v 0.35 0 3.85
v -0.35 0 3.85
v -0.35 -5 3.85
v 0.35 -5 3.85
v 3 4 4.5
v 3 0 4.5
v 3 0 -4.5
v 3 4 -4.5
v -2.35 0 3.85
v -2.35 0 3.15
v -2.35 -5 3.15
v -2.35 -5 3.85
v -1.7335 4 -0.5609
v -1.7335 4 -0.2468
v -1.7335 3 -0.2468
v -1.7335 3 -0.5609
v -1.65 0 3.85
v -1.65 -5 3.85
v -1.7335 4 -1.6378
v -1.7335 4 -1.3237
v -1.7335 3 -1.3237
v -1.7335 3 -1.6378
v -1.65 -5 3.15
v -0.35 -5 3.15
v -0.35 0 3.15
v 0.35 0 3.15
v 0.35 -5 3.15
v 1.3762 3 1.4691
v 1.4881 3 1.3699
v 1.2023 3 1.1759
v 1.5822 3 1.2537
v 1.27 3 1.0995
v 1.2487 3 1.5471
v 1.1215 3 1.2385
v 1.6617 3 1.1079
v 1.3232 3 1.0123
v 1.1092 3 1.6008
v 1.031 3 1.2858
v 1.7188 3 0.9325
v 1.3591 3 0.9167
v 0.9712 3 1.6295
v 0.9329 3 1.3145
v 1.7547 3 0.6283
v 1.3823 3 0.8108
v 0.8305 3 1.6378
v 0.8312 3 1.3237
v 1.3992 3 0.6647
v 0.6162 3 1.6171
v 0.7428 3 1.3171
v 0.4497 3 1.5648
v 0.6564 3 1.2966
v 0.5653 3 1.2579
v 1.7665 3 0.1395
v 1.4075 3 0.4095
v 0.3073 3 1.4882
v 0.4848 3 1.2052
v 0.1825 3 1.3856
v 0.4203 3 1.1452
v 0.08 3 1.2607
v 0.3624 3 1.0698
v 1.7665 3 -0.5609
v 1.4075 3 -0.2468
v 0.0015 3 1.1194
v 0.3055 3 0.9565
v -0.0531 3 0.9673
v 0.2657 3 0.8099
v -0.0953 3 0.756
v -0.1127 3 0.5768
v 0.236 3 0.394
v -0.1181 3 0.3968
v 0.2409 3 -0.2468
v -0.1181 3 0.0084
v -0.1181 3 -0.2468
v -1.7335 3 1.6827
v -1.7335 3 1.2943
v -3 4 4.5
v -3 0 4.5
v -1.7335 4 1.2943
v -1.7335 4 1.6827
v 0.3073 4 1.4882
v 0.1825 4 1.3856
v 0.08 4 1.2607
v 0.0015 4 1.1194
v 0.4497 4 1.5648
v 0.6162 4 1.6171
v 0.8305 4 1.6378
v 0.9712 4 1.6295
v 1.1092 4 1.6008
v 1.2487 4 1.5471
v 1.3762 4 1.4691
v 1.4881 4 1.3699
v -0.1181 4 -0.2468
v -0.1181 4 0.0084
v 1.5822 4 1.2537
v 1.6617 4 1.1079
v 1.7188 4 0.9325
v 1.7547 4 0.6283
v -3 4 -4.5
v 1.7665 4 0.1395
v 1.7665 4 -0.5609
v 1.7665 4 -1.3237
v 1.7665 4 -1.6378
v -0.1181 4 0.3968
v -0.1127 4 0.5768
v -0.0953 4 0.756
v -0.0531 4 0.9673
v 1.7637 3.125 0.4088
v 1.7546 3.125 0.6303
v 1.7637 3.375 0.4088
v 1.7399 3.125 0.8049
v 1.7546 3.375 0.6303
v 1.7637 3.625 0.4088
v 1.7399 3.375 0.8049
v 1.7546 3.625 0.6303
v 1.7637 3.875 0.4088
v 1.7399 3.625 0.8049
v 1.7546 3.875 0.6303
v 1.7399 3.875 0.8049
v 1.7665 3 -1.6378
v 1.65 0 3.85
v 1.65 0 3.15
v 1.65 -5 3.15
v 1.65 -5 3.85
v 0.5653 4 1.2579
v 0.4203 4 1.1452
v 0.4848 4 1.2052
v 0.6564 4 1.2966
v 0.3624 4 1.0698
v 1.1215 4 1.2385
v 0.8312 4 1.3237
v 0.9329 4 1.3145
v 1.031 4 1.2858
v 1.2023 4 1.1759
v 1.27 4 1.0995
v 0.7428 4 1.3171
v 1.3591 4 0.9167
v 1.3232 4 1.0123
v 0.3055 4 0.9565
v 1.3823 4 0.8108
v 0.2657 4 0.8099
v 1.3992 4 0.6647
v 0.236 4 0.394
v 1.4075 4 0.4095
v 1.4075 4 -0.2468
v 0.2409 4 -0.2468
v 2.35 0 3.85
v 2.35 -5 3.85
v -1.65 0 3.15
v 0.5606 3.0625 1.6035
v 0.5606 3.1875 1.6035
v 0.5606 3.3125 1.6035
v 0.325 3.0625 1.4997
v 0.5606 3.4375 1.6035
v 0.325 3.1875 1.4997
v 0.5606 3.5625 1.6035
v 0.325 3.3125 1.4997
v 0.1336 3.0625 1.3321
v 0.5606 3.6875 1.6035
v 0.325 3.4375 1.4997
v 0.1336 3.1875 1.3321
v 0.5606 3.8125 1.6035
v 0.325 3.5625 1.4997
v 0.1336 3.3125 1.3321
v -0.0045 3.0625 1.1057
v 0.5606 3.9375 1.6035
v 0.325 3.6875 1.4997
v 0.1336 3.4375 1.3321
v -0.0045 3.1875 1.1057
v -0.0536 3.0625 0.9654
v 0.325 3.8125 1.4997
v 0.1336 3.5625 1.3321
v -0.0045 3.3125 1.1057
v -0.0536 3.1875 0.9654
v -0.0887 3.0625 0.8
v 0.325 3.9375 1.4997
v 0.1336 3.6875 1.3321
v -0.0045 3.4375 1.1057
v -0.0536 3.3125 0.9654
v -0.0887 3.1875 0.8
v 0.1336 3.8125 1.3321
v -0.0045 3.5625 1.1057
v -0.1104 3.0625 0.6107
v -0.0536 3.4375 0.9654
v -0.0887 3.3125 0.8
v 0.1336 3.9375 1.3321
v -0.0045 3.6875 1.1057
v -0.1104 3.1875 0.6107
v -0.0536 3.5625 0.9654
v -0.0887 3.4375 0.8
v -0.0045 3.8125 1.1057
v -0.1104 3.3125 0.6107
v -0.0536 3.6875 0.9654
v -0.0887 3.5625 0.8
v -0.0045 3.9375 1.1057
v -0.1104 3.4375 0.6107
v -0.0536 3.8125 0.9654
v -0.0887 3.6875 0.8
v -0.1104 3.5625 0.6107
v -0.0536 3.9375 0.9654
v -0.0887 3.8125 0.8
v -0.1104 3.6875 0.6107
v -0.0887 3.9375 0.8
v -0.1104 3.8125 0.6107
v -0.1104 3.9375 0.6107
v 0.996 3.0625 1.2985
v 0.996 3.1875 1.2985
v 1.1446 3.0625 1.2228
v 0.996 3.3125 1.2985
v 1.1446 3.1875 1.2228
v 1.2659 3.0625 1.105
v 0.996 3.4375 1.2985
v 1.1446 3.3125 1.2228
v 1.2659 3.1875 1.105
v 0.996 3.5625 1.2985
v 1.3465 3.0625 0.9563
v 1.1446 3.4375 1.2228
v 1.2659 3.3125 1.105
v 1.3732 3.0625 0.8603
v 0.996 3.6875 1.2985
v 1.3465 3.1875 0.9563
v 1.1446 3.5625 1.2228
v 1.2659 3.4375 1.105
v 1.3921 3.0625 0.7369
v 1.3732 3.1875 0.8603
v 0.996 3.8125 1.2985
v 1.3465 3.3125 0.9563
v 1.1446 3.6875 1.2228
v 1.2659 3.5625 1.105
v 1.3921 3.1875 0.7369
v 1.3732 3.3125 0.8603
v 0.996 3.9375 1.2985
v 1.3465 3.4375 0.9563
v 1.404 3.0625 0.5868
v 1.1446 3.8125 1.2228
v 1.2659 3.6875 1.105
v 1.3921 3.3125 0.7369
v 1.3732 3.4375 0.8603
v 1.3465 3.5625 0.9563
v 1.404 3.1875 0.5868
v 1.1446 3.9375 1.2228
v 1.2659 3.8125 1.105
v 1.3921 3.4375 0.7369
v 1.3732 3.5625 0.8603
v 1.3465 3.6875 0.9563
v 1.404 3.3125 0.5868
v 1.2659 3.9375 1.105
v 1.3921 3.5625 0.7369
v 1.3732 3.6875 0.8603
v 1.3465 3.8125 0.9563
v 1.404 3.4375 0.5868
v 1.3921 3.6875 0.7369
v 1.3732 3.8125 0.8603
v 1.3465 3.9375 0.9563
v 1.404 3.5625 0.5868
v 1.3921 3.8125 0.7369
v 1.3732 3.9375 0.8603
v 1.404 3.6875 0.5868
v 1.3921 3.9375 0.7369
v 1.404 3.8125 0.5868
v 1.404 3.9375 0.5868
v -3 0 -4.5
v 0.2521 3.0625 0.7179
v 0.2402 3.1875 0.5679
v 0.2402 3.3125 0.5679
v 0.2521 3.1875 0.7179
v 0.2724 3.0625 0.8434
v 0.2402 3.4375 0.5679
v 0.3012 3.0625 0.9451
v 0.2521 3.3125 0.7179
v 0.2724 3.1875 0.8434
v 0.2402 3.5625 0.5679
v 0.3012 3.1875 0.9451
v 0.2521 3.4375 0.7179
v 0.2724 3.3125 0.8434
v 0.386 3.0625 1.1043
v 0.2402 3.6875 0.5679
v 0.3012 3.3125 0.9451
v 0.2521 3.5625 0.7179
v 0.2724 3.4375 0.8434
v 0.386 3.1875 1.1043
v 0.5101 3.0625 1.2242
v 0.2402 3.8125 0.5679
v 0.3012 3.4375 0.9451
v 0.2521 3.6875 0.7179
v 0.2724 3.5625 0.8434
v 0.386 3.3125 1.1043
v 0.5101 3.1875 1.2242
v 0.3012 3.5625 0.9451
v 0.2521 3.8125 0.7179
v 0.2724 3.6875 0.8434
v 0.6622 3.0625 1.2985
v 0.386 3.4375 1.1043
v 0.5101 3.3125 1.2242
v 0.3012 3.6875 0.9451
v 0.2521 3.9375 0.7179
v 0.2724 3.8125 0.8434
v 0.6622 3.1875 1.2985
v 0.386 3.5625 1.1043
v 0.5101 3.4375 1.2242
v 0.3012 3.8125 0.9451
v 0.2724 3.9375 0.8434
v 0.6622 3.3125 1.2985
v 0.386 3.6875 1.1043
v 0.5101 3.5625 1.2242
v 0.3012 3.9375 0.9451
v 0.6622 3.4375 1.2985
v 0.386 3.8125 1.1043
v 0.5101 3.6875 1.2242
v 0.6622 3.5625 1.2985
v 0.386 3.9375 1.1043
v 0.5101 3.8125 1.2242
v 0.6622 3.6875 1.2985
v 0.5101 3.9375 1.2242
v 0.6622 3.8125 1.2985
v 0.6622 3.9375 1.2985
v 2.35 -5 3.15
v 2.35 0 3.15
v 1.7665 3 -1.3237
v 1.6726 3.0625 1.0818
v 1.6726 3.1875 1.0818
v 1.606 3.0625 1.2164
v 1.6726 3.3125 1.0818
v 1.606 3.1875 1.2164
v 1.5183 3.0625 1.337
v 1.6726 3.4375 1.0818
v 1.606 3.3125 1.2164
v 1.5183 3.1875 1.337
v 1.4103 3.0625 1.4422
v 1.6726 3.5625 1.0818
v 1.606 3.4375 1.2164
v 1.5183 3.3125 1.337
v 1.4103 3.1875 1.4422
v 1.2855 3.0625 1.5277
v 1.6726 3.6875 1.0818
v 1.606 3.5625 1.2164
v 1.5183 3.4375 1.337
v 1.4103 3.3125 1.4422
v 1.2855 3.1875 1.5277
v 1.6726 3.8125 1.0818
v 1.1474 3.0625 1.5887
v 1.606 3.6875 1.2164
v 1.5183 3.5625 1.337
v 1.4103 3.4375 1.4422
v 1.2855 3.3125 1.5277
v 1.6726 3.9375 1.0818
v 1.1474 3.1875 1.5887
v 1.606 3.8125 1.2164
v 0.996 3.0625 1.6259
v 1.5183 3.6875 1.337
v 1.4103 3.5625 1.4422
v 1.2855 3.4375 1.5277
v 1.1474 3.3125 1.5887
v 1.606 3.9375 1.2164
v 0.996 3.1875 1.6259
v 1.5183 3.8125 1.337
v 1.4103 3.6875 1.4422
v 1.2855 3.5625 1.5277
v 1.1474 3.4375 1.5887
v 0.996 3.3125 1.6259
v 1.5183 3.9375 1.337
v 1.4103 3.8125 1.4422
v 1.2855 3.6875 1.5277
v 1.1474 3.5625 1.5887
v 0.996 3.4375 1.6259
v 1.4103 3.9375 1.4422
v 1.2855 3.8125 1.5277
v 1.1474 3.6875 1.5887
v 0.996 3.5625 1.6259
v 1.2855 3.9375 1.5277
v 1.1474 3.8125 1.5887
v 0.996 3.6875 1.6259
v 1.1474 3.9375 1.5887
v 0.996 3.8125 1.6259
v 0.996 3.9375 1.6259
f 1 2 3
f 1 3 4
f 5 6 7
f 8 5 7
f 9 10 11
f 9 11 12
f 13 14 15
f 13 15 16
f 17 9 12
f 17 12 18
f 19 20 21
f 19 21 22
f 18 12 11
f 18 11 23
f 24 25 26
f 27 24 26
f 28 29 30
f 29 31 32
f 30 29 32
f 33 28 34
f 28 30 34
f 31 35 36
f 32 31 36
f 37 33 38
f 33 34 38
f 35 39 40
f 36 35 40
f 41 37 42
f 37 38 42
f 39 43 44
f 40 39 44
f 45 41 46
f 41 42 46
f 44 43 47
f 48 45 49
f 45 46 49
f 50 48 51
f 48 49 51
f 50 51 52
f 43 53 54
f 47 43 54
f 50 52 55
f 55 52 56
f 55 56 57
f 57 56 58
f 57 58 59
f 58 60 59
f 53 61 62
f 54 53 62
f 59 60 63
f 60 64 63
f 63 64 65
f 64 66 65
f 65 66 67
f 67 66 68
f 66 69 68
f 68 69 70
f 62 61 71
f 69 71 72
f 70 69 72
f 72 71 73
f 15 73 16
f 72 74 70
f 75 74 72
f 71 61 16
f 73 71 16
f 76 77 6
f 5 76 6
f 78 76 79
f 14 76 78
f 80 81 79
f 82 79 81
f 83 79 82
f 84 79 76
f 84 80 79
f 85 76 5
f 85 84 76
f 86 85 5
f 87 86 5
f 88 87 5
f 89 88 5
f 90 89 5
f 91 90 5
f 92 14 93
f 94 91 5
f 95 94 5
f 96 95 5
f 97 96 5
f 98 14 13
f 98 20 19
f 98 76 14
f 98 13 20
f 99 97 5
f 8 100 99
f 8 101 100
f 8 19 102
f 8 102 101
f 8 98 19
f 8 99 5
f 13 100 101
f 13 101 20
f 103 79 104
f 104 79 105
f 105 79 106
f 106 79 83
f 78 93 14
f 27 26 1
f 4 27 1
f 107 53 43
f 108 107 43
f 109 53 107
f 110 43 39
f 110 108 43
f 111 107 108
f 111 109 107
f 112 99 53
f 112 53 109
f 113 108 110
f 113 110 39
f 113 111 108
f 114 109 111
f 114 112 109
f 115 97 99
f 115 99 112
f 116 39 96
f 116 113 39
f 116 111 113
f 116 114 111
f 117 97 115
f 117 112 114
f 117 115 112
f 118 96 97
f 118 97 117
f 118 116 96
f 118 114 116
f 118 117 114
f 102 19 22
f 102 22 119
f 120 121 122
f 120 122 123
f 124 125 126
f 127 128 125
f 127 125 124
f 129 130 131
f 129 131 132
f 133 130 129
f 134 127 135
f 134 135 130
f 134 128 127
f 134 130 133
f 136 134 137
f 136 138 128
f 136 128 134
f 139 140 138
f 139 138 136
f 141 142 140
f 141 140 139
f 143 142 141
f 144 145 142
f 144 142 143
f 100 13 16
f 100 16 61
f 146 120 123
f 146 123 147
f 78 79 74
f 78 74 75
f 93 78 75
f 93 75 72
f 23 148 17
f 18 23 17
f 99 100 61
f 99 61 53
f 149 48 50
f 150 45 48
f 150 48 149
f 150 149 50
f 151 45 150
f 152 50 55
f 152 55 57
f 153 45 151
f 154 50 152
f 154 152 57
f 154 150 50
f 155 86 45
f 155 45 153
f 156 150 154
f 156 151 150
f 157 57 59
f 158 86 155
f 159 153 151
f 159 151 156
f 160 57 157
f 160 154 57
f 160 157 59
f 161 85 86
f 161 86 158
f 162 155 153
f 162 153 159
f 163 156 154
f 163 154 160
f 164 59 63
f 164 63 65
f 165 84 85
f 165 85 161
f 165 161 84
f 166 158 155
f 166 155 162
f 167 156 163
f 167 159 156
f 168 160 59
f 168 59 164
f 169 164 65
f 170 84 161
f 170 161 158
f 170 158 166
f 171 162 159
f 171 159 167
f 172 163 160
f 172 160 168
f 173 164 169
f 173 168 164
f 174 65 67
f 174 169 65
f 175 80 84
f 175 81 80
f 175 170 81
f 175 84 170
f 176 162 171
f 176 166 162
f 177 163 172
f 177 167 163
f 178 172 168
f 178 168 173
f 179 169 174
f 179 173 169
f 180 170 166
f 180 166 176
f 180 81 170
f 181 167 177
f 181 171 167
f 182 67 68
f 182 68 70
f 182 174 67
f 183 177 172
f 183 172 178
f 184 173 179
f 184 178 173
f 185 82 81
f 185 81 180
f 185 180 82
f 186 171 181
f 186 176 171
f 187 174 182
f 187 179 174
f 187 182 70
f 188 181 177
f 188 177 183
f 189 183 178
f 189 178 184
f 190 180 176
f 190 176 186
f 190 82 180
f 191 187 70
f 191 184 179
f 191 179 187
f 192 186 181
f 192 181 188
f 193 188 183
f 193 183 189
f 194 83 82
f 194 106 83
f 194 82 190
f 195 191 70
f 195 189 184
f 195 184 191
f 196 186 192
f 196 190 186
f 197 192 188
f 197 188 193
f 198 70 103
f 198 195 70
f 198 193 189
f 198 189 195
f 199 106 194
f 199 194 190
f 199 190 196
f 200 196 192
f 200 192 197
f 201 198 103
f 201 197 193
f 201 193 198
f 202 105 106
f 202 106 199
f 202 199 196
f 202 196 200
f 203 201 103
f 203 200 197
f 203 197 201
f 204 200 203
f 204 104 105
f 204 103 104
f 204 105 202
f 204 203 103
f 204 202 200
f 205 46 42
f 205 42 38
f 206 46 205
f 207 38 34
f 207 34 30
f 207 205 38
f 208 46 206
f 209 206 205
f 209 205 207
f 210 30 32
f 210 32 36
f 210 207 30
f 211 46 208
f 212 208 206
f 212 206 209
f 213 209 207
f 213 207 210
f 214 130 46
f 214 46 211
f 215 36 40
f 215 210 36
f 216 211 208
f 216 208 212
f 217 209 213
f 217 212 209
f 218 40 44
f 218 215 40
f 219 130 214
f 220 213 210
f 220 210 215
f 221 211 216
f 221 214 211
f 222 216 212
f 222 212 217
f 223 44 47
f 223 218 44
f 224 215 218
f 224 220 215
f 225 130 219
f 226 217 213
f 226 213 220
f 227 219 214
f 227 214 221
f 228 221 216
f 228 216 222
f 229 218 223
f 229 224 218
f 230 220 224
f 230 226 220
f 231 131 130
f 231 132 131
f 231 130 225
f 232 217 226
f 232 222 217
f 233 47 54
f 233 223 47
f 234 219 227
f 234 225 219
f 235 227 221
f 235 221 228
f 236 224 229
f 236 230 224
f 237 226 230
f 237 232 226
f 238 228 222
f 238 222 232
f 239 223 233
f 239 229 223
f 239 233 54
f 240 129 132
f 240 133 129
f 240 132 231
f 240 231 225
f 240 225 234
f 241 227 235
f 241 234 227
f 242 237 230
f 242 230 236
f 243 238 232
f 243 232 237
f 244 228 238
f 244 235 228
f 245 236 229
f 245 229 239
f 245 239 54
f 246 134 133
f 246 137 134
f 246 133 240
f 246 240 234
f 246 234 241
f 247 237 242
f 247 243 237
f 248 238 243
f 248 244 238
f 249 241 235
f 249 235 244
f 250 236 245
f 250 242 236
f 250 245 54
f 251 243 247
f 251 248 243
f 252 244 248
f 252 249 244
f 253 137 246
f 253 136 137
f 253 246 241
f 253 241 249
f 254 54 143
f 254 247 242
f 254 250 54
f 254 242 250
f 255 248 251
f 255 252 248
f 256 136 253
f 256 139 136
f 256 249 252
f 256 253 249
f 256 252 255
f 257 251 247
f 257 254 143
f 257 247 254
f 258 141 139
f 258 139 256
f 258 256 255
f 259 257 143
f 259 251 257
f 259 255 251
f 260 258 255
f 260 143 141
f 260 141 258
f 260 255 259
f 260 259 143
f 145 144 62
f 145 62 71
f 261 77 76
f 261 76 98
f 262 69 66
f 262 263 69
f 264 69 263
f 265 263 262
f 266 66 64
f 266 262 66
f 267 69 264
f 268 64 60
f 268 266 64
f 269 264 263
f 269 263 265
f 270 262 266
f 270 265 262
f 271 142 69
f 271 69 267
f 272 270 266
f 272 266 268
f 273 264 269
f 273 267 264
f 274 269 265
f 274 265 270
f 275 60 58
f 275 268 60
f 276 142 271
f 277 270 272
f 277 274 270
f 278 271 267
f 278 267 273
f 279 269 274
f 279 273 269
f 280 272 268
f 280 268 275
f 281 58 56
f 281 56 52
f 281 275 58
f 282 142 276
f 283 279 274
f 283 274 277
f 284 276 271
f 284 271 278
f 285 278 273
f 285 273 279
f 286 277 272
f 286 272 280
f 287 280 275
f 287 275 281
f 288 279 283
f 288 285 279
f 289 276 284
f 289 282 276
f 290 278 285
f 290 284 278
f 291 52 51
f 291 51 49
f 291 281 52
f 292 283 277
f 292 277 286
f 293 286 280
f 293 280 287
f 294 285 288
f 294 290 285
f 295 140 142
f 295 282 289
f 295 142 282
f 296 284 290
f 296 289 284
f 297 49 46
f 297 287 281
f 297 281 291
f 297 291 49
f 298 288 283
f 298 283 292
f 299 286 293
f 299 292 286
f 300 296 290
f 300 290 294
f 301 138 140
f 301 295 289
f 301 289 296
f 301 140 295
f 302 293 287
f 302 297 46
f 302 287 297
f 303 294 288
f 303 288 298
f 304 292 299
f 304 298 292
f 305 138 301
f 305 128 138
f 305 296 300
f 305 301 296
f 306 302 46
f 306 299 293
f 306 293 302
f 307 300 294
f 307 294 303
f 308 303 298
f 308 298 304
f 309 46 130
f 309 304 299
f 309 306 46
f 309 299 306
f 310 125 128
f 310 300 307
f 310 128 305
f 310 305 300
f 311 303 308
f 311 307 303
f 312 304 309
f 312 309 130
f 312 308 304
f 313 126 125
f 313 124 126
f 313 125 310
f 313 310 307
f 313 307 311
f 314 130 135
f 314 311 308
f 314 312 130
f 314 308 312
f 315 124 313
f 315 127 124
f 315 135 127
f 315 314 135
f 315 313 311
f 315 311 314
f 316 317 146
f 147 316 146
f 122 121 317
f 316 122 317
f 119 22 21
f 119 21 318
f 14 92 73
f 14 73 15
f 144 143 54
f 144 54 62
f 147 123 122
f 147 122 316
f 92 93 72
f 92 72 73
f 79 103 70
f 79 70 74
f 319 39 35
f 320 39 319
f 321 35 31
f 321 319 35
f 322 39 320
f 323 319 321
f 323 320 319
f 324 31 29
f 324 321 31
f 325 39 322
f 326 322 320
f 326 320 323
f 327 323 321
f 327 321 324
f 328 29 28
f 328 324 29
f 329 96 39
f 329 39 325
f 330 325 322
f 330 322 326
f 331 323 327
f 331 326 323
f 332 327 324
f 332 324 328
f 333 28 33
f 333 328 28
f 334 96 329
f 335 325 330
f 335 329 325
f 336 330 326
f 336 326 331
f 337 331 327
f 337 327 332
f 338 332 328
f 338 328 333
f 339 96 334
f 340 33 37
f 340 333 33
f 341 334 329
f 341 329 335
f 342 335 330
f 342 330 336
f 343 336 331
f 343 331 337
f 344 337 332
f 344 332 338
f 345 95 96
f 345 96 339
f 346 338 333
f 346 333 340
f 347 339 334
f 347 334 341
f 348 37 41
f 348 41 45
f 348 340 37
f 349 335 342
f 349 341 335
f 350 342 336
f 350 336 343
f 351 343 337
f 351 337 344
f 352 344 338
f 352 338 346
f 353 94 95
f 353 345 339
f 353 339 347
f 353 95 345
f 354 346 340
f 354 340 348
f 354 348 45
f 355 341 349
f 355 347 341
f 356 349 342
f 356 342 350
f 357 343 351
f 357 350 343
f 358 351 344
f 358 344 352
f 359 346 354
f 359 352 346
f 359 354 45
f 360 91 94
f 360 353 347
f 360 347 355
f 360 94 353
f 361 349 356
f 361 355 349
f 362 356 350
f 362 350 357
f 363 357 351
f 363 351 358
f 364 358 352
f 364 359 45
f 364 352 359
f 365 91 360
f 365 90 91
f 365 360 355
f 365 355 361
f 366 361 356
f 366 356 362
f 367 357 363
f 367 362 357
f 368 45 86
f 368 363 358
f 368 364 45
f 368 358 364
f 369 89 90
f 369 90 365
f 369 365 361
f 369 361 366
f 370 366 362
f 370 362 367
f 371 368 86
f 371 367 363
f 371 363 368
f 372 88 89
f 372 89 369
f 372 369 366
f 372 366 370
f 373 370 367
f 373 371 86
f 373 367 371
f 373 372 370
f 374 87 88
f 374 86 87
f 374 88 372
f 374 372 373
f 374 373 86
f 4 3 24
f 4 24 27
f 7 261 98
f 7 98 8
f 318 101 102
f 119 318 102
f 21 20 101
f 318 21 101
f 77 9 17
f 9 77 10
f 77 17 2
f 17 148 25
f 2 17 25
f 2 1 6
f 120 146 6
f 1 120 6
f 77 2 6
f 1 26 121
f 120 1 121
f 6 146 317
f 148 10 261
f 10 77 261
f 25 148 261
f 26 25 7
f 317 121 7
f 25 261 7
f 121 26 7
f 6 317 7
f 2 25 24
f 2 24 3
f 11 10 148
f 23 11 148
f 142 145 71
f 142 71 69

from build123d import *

# Parameters (mm, degrees)
SKETCH1_W           = 6
SKETCH1_H           = 9
BOSS_EXTRUDE1_DEPTH = 4
SKETCH2_W           = 0.7
SKETCH2_H           = 0.7
BOSS_EXTRUDE2_DEPTH = 5
SKETCH3_W           = 3.5
SKETCH3_H           = 0.314102564
CUT_EXTRUDE1_DEPTH  = 1


with BuildPart() as part:
    # Sketch1 → Boss-Extrude1 (new body)
    with BuildSketch(Plane(origin=(0, 0, 0), x_dir=(1, 0, 0), z_dir=(0, 1, 0))):
        Rectangle(SKETCH1_W, SKETCH1_H)
    extrude(amount=BOSS_EXTRUDE1_DEPTH)

    # Sketch2 → Boss-Extrude2 (add)
    with BuildSketch(Plane.XZ):
        with Locations((-2, 3.5)):
            Rectangle(SKETCH2_W, SKETCH2_H)
        with Locations((0, 3.5)):
            Rectangle(SKETCH2_W, SKETCH2_H)
        with Locations((2, 3.5)):
            Rectangle(SKETCH2_W, SKETCH2_H)
    extrude(amount=BOSS_EXTRUDE2_DEPTH)

    # Sketch3 → Cut-Extrude1 (cut)
    # profile 1 of 2: a face of its own
    with BuildSketch(Plane(origin=(0, 4, 0), x_dir=(1, 0, 0), z_dir=(0, 1, 0))):
        with Locations((0.016516605, 1.480769231)):
            Rectangle(SKETCH3_W, SKETCH3_H)
    # profile 2 of 2: a face of its own
    with BuildSketch(Plane(origin=(0, 4, 0), x_dir=(1, 0, 0), z_dir=(0, 1, 0))):
        with BuildLine():
            Line((1.766516605, 0.560897436), (1.766516605, -0.139523237))
            add(Edge.make_bspline(
                [(1.766516605, -0.139523237), (1.766361019, -0.186264366), (1.766062277, -0.27601251), (1.764396514, -0.40458578), (1.759622158, -0.521412877), (1.755513575, -0.626432717), (1.748021633, -0.719643372), (1.740860986, -0.801330663), (1.731487326, -0.87111836), (1.722781903, -0.913364211), (1.718840323, -0.932491987)],
                knots=[0, 0, 0, 0, 1.410062039, 2.707475311, 3.878576406, 4.937260626, 5.877586885, 6.699081471, 7.410979367, 8, 8, 8, 8], degree=3))
            add(Edge.make_bspline(
                [(1.718840323, -0.932491987), (1.712514276, -0.958099062), (1.699997132, -1.008766944), (1.673527119, -1.081710467), (1.64294591, -1.151248932), (1.606748352, -1.217121383), (1.565565808, -1.27933393), (1.519157663, -1.337793424), (1.467287579, -1.392165635), (1.4112801, -1.442868932), (1.350646542, -1.488829838), (1.286270173, -1.528602989), (1.218553628, -1.562660539), (1.147261096, -1.589849705), (1.072995235, -1.611722556), (0.995107565, -1.627150208), (0.913946279, -1.636401005), (0.858588413, -1.637342914), (0.830519009, -1.637820513)],
                knots=[0, 0, 0, 0, 1.02737288, 2.032829108, 3.019628684, 3.985738875, 4.958353778, 5.924249254, 6.890702889, 7.883913451, 8.865824512, 9.85161466, 10.829249435, 11.81541824, 12.821369441, 13.843154991, 14.906364023, 16, 16, 16, 16], degree=3))
            add(Edge.make_bspline(
                [(0.830519009, -1.637820513), (0.783883851, -1.636351553), (0.692886578, -1.633485231), (0.560826446, -1.606759595), (0.437634391, -1.562985023), (0.323481852, -1.502654559), (0.220533831, -1.425861636), (0.130417059, -1.333574003), (0.05430934, -1.22626297), (0.002092736, -1.125894415), (-0.031505665, -1.037192031), (-0.055264297, -0.963952361), (-0.073311274, -0.883999597), (-0.089713454, -0.798480783), (-0.102229635, -0.706735362), (-0.111118503, -0.608948089), (-0.116834112, -0.50487439), (-0.117669187, -0.433534628), (-0.118098779, -0.396834936)],
                knots=[0, 0, 0, 0, 1.260402266, 2.459371274, 3.627181936, 4.786749125, 5.93865593, 7.087644312, 8.261344208, 9.485713728, 10.136162886, 10.825977872, 11.566646758, 12.35154167, 13.181268117, 14.0701832, 15.007234106, 16, 16, 16, 16], degree=3))
            Line((-0.118098779, -0.396834936), (-1.733483395, -1.682692308))
            Line((-1.733483395, -1.682692308), (-1.733483395, -1.294270833))
            Line((-1.733483395, -1.294270833), (-0.118098779, -0.008413462))
            Line((-0.118098779, -0.008413462), (-0.118098779, 0.246794872))
            Line((-0.118098779, 0.246794872), (-1.733483395, 0.246794872))
            Line((-1.733483395, 0.246794872), (-1.733483395, 0.560897436))
            Line((-1.733483395, 0.560897436), (1.766516605, 0.560897436))
        make_face()
        with BuildLine():
            Line((1.407542246, 0.246794872), (0.24087558, 0.246794872))
            Line((0.24087558, 0.246794872), (0.235967727, -0.394030449))
            add(Edge.make_bspline(
                [(0.235967727, -0.394030449), (0.23595449, -0.423950488), (0.235928834, -0.481944044), (0.239922609, -0.565844711), (0.244465932, -0.643964817), (0.251415263, -0.716005588), (0.260371383, -0.781999101), (0.271574209, -0.841912719), (0.284626785, -0.895843103), (0.304826248, -0.958744454), (0.336846887, -1.02896197), (0.383355041, -1.105368013), (0.442230666, -1.170213186), (0.508484032, -1.226122294), (0.582826418, -1.269186547), (0.661958048, -1.300529767), (0.745195752, -1.320199384), (0.802367596, -1.322537824), (0.831220131, -1.323717949)],
                knots=[0, 0, 0, 0, 1.14660753, 2.222451964, 3.218720504, 4.145691244, 4.995719623, 5.770487122, 6.480909919, 7.121111896, 8.299844659, 9.430703709, 10.534634535, 11.641396424, 12.741395289, 13.810956493, 14.895269934, 16, 16, 16, 16], degree=3))
            add(Edge.make_bspline(
                [(0.831220131, -1.323717949), (0.85937451, -1.322534196), (0.915166216, -1.320188431), (0.996619653, -1.300491656), (1.074046514, -1.268684245), (1.145970993, -1.224082893), (1.211802985, -1.170189), (1.267351902, -1.106181988), (1.313870883, -1.035285329), (1.343381026, -0.968975107), (1.361509576, -0.909746951), (1.37425074, -0.858314844), (1.384573588, -0.799980074), (1.392599408, -0.734882443), (1.399821729, -0.663139722), (1.40450449, -0.584555466), (1.407334752, -0.499220423), (1.407471472, -0.440073241), (1.407542246, -0.409455128)],
                knots=[0, 0, 0, 0, 1.100801541, 2.181386982, 3.260112282, 4.364594493, 5.481957178, 6.577424609, 7.668452592, 8.790448866, 9.403819393, 10.091598921, 10.863153553, 11.720938239, 12.658472417, 13.685008818, 14.801622349, 16, 16, 16, 16], degree=3))
            Line((1.407542246, -0.409455128), (1.407542246, 0.246794872))
        make_face(mode=Mode.SUBTRACT)
    extrude(amount=-CUT_EXTRUDE1_DEPTH, mode=Mode.SUBTRACT)


solid = part.part
